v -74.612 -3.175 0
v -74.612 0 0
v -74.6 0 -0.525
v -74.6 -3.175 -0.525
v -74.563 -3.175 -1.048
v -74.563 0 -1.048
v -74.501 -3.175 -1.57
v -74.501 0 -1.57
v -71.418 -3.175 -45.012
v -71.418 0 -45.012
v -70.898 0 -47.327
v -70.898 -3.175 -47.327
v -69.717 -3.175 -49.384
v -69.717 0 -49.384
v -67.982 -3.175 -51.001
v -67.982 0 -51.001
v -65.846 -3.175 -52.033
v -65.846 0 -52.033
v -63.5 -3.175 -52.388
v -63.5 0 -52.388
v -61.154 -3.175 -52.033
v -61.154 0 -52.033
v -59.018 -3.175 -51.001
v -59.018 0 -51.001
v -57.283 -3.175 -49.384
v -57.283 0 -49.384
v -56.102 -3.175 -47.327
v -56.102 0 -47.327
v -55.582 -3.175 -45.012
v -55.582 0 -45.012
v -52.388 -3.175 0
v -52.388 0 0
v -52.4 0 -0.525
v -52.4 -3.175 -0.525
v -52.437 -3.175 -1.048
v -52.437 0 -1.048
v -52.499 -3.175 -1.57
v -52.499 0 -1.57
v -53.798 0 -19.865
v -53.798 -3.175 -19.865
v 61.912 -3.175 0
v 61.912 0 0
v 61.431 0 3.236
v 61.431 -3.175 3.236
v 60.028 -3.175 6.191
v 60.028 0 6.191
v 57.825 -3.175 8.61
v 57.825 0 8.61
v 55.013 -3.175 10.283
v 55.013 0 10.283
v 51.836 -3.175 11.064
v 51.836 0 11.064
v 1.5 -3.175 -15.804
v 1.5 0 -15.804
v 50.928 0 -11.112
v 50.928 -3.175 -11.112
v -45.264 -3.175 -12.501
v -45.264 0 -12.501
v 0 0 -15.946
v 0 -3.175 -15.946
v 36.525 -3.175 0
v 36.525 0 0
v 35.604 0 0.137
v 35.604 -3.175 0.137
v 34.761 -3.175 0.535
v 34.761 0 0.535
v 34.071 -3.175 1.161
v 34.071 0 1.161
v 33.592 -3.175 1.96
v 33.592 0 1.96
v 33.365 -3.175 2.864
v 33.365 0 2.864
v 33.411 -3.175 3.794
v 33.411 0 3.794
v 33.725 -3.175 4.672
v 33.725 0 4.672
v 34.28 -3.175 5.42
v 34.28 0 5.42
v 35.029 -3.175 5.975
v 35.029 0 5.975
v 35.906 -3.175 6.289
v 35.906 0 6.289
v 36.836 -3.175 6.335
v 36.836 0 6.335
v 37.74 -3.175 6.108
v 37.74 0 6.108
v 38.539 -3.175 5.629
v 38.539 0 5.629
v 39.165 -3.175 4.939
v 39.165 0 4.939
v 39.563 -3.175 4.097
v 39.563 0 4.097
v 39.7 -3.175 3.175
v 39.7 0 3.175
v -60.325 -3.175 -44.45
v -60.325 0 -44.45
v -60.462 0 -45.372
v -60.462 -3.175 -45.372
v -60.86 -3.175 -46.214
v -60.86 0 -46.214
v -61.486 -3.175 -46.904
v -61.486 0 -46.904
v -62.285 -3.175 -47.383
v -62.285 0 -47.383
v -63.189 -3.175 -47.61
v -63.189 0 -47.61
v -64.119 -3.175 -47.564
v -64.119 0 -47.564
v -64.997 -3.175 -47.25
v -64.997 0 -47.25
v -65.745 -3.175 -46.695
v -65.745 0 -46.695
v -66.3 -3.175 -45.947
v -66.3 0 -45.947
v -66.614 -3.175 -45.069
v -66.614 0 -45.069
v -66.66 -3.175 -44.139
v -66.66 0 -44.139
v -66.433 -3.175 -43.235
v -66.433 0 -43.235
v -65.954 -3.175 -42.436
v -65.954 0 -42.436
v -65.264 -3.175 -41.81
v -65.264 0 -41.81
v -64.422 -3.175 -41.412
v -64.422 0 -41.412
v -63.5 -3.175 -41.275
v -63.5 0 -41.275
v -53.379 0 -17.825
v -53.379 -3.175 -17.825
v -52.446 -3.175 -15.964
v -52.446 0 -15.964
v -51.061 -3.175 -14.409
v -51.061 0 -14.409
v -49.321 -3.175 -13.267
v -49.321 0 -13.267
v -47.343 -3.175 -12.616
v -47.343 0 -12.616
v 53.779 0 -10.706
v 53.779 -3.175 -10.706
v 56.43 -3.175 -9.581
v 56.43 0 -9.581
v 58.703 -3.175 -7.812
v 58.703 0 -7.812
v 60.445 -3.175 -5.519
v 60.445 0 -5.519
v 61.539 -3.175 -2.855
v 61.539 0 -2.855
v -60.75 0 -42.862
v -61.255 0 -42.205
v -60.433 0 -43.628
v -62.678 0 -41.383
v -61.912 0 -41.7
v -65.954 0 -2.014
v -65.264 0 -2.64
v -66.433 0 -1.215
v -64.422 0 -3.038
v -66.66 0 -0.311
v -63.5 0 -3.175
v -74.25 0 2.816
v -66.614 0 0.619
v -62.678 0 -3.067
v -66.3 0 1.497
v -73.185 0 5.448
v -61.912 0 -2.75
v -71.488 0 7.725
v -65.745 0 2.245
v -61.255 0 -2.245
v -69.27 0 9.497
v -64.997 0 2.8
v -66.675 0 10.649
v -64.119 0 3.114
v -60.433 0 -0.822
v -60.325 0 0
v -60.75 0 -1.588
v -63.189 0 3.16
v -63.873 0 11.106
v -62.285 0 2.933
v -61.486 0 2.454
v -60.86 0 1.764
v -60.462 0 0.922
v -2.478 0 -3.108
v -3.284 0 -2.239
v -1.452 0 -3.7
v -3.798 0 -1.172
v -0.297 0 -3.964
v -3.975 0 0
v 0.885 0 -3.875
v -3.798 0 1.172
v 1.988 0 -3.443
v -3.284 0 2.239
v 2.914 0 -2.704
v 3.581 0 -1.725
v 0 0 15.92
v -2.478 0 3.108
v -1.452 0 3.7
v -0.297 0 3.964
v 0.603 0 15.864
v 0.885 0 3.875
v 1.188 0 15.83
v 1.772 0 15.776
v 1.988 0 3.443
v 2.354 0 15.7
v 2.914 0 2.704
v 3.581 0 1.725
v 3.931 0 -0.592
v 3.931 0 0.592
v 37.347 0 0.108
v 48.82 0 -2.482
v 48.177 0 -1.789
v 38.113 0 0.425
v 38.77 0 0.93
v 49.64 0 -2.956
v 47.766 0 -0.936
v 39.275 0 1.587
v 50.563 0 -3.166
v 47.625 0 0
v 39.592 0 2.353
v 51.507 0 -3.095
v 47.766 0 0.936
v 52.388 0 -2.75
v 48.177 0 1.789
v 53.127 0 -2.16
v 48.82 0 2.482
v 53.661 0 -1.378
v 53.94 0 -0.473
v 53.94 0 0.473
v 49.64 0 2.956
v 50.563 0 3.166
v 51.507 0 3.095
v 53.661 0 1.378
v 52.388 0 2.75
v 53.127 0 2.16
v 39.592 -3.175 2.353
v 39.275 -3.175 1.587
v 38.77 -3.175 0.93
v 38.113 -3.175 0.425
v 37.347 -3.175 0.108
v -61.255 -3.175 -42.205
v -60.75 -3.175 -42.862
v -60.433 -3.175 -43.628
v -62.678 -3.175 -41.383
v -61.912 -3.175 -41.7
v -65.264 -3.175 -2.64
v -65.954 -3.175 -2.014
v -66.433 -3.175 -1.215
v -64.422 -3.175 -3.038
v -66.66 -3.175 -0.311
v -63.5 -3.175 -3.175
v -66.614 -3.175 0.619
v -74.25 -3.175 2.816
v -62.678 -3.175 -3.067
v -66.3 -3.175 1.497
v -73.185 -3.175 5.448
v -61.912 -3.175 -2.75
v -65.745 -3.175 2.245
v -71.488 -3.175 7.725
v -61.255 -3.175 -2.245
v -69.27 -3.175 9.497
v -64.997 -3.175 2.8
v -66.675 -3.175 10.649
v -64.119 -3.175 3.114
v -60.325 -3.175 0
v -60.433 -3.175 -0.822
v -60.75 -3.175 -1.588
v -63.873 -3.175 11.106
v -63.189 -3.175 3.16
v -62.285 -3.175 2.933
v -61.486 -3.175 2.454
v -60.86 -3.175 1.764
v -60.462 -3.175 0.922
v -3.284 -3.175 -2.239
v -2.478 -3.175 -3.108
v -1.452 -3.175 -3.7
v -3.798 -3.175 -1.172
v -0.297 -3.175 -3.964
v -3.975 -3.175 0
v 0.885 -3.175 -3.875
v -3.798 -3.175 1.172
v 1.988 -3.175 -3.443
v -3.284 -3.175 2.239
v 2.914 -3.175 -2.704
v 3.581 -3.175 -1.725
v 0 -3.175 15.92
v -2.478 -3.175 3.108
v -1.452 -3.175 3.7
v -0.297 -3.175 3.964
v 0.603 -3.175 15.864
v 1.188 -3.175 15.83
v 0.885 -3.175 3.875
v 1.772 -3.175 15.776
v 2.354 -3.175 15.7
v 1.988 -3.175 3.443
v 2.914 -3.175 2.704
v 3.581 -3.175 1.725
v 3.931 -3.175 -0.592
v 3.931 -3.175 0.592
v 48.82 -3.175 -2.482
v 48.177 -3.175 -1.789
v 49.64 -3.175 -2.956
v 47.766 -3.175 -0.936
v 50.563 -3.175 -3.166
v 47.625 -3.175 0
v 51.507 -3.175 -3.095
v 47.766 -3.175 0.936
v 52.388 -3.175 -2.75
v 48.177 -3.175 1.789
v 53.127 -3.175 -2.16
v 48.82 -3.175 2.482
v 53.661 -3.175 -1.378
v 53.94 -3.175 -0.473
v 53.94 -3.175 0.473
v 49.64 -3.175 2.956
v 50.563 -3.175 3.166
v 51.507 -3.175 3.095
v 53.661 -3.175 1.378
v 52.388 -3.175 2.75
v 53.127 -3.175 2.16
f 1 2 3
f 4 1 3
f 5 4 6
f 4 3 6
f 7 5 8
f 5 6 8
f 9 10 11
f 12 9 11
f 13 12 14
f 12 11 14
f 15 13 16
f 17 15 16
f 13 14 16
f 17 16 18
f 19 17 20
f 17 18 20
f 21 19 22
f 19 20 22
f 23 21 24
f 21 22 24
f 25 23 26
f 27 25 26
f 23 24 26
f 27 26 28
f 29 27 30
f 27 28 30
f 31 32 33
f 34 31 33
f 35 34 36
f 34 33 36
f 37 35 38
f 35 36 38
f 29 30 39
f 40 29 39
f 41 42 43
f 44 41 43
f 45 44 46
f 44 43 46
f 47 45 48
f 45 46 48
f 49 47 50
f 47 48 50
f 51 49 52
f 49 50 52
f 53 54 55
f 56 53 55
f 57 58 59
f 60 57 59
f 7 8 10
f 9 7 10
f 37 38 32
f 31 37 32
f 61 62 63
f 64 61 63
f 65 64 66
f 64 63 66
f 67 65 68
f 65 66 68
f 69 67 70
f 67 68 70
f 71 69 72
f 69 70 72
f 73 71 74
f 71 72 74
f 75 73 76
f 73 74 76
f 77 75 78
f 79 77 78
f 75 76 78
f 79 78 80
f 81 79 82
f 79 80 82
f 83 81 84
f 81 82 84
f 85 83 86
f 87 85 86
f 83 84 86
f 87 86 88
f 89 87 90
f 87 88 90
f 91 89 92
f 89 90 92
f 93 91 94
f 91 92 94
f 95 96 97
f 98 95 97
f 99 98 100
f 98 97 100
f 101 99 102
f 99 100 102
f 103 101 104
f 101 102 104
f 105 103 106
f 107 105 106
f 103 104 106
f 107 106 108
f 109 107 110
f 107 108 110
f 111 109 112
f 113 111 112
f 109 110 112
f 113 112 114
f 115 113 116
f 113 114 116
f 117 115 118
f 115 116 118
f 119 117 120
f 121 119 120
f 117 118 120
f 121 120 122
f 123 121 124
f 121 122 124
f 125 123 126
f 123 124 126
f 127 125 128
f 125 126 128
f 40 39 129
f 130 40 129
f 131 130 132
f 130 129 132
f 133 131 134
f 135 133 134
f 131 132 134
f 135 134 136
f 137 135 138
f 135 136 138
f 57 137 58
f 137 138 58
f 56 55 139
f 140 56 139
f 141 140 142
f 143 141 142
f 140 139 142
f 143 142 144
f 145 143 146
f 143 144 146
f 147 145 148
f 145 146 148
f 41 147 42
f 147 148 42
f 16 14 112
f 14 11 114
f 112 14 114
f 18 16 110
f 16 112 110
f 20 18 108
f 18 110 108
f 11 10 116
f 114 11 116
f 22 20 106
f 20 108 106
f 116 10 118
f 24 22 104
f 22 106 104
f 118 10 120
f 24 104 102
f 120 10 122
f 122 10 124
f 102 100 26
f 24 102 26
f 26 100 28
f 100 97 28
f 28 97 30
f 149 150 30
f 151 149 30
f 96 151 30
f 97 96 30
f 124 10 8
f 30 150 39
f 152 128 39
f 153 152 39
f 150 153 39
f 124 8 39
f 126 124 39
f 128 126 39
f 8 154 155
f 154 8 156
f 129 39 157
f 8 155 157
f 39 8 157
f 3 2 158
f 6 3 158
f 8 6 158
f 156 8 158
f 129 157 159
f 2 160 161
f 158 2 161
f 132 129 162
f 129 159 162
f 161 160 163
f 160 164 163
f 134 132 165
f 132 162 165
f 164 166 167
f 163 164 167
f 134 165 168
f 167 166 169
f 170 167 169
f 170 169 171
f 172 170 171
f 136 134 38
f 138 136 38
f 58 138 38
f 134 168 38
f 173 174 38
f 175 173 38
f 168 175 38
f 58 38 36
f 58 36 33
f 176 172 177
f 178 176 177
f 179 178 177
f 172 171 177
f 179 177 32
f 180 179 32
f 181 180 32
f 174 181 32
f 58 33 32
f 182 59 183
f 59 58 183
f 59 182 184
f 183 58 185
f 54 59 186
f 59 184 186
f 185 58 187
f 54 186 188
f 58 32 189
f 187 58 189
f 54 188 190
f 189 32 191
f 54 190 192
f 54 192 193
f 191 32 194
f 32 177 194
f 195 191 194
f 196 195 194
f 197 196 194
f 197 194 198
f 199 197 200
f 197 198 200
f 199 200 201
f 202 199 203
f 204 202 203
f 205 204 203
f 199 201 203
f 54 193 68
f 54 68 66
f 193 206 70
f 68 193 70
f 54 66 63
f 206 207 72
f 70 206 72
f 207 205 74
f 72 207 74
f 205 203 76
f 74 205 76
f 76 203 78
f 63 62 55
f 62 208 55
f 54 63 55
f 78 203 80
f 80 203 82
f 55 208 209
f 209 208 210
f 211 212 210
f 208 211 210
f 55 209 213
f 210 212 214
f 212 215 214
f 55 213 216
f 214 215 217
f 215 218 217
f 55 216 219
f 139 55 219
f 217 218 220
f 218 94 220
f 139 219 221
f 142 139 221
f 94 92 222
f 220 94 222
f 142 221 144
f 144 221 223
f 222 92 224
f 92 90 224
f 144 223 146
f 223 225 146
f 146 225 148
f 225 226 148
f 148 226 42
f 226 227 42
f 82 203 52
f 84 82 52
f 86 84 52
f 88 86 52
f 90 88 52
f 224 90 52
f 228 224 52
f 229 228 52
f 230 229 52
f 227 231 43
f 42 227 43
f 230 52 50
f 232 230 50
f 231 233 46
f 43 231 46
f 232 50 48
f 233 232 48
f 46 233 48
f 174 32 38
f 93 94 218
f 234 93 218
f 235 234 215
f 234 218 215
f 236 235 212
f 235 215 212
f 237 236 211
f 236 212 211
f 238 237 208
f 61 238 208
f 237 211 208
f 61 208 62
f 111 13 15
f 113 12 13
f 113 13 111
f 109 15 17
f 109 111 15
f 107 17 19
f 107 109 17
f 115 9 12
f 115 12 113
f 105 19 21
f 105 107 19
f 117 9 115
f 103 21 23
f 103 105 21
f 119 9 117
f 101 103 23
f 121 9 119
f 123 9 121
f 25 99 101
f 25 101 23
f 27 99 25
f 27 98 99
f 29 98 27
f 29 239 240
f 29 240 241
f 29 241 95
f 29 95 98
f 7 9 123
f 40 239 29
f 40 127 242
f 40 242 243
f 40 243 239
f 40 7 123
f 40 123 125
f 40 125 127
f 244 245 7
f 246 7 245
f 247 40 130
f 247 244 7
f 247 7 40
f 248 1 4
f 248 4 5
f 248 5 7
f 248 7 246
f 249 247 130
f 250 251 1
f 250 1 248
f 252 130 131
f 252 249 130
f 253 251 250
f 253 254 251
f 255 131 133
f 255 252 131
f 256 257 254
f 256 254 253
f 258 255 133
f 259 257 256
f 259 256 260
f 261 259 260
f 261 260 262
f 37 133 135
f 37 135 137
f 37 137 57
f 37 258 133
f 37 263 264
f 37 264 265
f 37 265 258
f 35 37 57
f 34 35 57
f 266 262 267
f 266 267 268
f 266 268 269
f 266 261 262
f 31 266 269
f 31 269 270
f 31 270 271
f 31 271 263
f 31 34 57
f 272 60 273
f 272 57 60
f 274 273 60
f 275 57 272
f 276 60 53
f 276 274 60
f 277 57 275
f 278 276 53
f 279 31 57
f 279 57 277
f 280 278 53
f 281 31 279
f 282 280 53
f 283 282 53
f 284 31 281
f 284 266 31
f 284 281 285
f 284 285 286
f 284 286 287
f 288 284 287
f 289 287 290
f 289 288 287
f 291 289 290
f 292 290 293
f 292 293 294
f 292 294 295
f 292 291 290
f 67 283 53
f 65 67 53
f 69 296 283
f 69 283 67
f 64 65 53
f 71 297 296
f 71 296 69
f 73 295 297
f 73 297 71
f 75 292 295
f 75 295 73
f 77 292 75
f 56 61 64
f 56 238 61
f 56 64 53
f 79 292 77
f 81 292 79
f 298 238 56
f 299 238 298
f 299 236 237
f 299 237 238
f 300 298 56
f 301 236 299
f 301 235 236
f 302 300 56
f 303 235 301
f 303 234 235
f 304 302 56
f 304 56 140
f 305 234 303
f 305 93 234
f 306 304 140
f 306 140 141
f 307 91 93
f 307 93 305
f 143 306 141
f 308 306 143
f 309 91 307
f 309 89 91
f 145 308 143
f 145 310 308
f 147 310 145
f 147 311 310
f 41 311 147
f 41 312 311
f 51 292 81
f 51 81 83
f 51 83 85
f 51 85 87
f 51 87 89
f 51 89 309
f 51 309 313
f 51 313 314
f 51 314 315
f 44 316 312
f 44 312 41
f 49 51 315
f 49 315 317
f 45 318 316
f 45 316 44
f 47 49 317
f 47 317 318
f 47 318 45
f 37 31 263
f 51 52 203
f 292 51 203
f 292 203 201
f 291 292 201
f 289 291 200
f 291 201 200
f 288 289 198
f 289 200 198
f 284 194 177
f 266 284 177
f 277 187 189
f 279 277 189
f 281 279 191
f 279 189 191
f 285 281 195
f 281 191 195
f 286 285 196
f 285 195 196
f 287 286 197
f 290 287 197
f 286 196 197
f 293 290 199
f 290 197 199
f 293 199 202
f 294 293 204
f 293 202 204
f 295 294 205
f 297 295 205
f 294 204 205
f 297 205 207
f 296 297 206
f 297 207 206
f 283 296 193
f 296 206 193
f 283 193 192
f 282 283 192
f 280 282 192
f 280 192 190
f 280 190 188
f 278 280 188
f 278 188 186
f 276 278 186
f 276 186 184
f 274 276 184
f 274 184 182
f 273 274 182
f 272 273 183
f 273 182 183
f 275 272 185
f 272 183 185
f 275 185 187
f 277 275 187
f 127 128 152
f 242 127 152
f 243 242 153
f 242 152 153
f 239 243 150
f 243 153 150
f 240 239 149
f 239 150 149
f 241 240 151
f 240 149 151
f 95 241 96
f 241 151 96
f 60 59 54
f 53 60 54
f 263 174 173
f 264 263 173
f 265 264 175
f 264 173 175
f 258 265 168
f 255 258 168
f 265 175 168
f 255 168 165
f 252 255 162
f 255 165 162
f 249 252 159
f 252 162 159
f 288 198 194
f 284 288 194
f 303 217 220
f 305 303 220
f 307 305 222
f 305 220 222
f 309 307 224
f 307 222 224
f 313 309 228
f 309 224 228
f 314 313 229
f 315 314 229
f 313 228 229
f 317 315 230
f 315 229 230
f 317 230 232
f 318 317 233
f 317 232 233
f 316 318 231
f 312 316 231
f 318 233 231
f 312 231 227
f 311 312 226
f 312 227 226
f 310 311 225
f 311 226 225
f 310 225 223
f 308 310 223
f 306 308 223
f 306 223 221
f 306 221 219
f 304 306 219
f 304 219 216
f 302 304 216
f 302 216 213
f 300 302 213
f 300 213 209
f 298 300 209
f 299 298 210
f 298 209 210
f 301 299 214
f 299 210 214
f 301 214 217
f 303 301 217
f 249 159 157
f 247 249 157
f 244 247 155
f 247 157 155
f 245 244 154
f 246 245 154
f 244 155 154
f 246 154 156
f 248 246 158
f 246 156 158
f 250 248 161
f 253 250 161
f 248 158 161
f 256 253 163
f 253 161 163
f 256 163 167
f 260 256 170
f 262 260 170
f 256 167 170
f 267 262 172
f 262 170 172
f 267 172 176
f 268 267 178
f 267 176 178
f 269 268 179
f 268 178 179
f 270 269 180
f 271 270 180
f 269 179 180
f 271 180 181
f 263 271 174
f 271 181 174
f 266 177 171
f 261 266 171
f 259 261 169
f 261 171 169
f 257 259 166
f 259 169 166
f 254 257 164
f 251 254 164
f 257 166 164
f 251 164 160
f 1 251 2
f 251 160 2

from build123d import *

# Parameters (mm, degrees)
F1_DEPTH = 3.175


with BuildPart() as f1:
    # F0 (on Front) → F1 (new body)
    with BuildSketch(Plane.XZ):
        with BuildLine():
            Line((15.875, 0), (3.9751, 0))
            ThreePointArc((3.9751, 0), (0, -3.9751), (-3.9751, 0))
            Line((-3.9751, 0), (-15.875, 0))
            ThreePointArc((-15.875, 0), (-10.6817358486, -11.7437704448), (1.5002622689, -15.8039500798))
            ThreePointArc((1.5002622689, -15.8039500798), (11.7437704448, -10.6817358486), (15.875, 0))
        make_face()
        with BuildLine():
            ThreePointArc((-3.9751, 0), (0, 3.9751), (3.9751, 0))
            Line((3.9751, 0), (15.875, 0))
            ThreePointArc((15.875, 0), (12.0288225692, 10.3596840009), (2.3539854993, 15.6995024529))
            Line((2.3539854993, 15.6995024529), (0.6027935511, 15.8635514603))
            ThreePointArc((0.6027935511, 15.8635514603), (-0.2955948224, 15.872247752), (-1.1930364393, 15.8301070449))
            ThreePointArc((-1.1930364393, 15.8301070449), (-11.6394819145, 10.7952807172), (-15.875, 0))
            Line((-15.875, 0), (-3.9751, 0))
        make_face()
        with BuildLine():
            Line((36.5252, 0), (15.875, 0))
            ThreePointArc((15.875, 0), (11.7437704448, -10.6817358486), (1.5002622689, -15.8039500798))
            Line((1.5002622689, -15.8039500798), (50.9283921277, -11.1117582637))
            ThreePointArc((50.9283921277, -11.1117582637), (42.9878012464, -7.9029872127), (39.6875, 0))
            Line((39.6875, 0), (36.5252, 0))
        make_face()
        with BuildLine():
            ThreePointArc((2.3539854993, 15.6995024529), (12.0288225692, 10.3596840009), (15.875, 0))
            Line((15.875, 0), (36.5252, 0))
            Line((36.5252, 0), (39.6875, 0))
            ThreePointArc((39.6875, 0), (43.3176892897, 8.2160016239), (51.8364642626, 11.064058843))
            Line((51.8364642626, 11.064058843), (2.3539854993, 15.6995024529))
        make_face()
        with BuildLine():
            ThreePointArc((39.7002, 3.175), (38.7702640303, 0.9299359697), (36.5252, 0))
            ThreePointArc((36.5252, 0), (34.2801359697, 5.4200640303), (39.7002, 3.175))
        make_face(mode=Mode.SUBTRACT)
        with BuildLine():
            Line((-52.3875, 0), (-15.875, 0))
            ThreePointArc((-15.875, 0), (-11.6394819145, 10.7952807172), (-1.1930364393, 15.8301070449))
            Line((-1.1930364393, 15.8301070449), (-63.8728285154, 11.1062439712))
            ThreePointArc((-63.8728285154, 11.1062439712), (-55.7752152337, 7.9884514497), (-52.3875, 0))
        make_face()
        with BuildLine():
            ThreePointArc((1.5002622689, -15.8039500798), (-10.6817358486, -11.7437704448), (-15.875, 0))
            Line((-15.875, 0), (-52.3875, 0))
            ThreePointArc((-52.3875, 0), (-52.4153874044, -0.7867781489), (-52.4989096478, -1.5696073753))
            ThreePointArc((-52.4989096478, -1.5696073753), (-56.2183314312, -8.3943408975), (-63.5, -11.1125))
            Line((-63.5, -11.1125), (-63.5, -36.5125))
            ThreePointArc((-63.5, -36.5125), (-57.8873399243, -38.8373399243), (-55.5625, -44.45))
            ThreePointArc((-55.5625, -44.45), (-55.5674814568, -44.7311686533), (-55.5824195746, -45.0119843921))
            Line((-55.5824195746, -45.0119843921), (-53.7975104819, -19.8650915378))
            ThreePointArc((-53.7975104819, -19.8650915378), (-51.0613936601, -14.4091151142), (-45.2638074239, -12.5007105892))
            Line((-45.2638074239, -12.5007105892), (0, -15.9463693532))
            Line((0, -15.9463693532), (1.5002622689, -15.8039500798))
        make_face()
        with BuildLine():
            Line((0.6027935511, 15.8635514603), (2.3539854993, 15.6995024529))
            ThreePointArc((2.3539854993, 15.6995024529), (1.4806632323, 15.8057983472), (0.6027935511, 15.8635514603))
        make_face()
        with BuildLine():
            Line((0, 15.9200202465), (-1.1930364393, 15.8301070449))
            ThreePointArc((-1.1930364393, 15.8301070449), (-0.2955948224, 15.872247752), (0.6027935511, 15.8635514603))
            Line((0.6027935511, 15.8635514603), (0, 15.9200202465))
        make_face()
        with BuildLine():
            Line((-60.325, 0), (-52.3875, 0))
            ThreePointArc((-52.3875, 0), (-55.7752152337, 7.9884514497), (-63.8728285154, 11.1062439712))
            ThreePointArc((-63.8728285154, 11.1062439712), (-71.4884514497, 7.7247847663), (-74.6125, 0))
            Line((-74.6125, 0), (-74.5010903522, -1.5696073753))
            ThreePointArc((-74.5010903522, -1.5696073753), (-70.7816685688, -8.3943408975), (-63.5, -11.1125))
            Line((-63.5, -11.1125), (-63.5, -3.175))
            ThreePointArc((-63.5, -3.175), (-65.7450640303, 2.2450640303), (-60.325, 0))
        make_face()
        with BuildLine():
            ThreePointArc((61.9125, 0), (59.0160016239, 7.4823107103), (51.8364642626, 11.064058843))
            ThreePointArc((51.8364642626, 11.064058843), (43.3176892897, 8.2160016239), (39.6875, 0))
            ThreePointArc((39.6875, 0), (42.9878012464, -7.9029872127), (50.9283921277, -11.1117582637))
            ThreePointArc((50.9283921277, -11.1117582637), (58.7029872127, -7.8121987536), (61.9125, 0))
        make_face()
        with BuildLine():
            ThreePointArc((53.975, 0), (50.8, -3.175), (47.625, 0))
            ThreePointArc((47.625, 0), (50.8, 3.175), (53.975, 0))
        make_face(mode=Mode.SUBTRACT)
        with BuildLine():
            Line((-74.5010903522, -1.5696073753), (-74.6125, 0))
            ThreePointArc((-74.6125, 0), (-74.5846125956, -0.7867781489), (-74.5010903522, -1.5696073753))
        make_face()
        with BuildLine():
            Line((-63.5, -36.5125), (-63.5, -11.1125))
            ThreePointArc((-63.5, -11.1125), (-70.7816685688, -8.3943408975), (-74.5010903522, -1.5696073753))
            Line((-74.5010903522, -1.5696073753), (-71.4175804254, -45.0119843921))
            ThreePointArc((-71.4175804254, -45.0119843921), (-69.3079539152, -39.0396786076), (-63.5, -36.5125))
        make_face()
        with BuildLine():
            ThreePointArc((-55.5625, -44.45), (-57.8873399243, -38.8373399243), (-63.5, -36.5125))
            ThreePointArc((-63.5, -36.5125), (-69.3079539152, -39.0396786076), (-71.4175804254, -45.0119843921))
            ThreePointArc((-71.4175804254, -45.0119843921), (-63.5, -52.3875), (-55.5824195746, -45.0119843921))
            ThreePointArc((-55.5824195746, -45.0119843921), (-55.5674814568, -44.7311686533), (-55.5625, -44.45))
        make_face()
        with BuildLine():
            ThreePointArc((-60.325, -44.45), (-65.7450640303, -46.6950640303), (-63.5, -41.275))
            ThreePointArc((-63.5, -41.275), (-61.2549359697, -42.2049359697), (-60.325, -44.45))
        make_face(mode=Mode.SUBTRACT)
        with BuildLine():
            Line((-52.4989096478, -1.5696073753), (-52.3875, 0))
            Line((-52.3875, 0), (-60.325, 0))
            ThreePointArc((-60.325, 0), (-61.2549359697, -2.2450640303), (-63.5, -3.175))
            Line((-63.5, -3.175), (-63.5, -11.1125))
            ThreePointArc((-63.5, -11.1125), (-56.2183314312, -8.3943408975), (-52.4989096478, -1.5696073753))
        make_face()
    extrude(amount=F1_DEPTH)


solid = f1.part
